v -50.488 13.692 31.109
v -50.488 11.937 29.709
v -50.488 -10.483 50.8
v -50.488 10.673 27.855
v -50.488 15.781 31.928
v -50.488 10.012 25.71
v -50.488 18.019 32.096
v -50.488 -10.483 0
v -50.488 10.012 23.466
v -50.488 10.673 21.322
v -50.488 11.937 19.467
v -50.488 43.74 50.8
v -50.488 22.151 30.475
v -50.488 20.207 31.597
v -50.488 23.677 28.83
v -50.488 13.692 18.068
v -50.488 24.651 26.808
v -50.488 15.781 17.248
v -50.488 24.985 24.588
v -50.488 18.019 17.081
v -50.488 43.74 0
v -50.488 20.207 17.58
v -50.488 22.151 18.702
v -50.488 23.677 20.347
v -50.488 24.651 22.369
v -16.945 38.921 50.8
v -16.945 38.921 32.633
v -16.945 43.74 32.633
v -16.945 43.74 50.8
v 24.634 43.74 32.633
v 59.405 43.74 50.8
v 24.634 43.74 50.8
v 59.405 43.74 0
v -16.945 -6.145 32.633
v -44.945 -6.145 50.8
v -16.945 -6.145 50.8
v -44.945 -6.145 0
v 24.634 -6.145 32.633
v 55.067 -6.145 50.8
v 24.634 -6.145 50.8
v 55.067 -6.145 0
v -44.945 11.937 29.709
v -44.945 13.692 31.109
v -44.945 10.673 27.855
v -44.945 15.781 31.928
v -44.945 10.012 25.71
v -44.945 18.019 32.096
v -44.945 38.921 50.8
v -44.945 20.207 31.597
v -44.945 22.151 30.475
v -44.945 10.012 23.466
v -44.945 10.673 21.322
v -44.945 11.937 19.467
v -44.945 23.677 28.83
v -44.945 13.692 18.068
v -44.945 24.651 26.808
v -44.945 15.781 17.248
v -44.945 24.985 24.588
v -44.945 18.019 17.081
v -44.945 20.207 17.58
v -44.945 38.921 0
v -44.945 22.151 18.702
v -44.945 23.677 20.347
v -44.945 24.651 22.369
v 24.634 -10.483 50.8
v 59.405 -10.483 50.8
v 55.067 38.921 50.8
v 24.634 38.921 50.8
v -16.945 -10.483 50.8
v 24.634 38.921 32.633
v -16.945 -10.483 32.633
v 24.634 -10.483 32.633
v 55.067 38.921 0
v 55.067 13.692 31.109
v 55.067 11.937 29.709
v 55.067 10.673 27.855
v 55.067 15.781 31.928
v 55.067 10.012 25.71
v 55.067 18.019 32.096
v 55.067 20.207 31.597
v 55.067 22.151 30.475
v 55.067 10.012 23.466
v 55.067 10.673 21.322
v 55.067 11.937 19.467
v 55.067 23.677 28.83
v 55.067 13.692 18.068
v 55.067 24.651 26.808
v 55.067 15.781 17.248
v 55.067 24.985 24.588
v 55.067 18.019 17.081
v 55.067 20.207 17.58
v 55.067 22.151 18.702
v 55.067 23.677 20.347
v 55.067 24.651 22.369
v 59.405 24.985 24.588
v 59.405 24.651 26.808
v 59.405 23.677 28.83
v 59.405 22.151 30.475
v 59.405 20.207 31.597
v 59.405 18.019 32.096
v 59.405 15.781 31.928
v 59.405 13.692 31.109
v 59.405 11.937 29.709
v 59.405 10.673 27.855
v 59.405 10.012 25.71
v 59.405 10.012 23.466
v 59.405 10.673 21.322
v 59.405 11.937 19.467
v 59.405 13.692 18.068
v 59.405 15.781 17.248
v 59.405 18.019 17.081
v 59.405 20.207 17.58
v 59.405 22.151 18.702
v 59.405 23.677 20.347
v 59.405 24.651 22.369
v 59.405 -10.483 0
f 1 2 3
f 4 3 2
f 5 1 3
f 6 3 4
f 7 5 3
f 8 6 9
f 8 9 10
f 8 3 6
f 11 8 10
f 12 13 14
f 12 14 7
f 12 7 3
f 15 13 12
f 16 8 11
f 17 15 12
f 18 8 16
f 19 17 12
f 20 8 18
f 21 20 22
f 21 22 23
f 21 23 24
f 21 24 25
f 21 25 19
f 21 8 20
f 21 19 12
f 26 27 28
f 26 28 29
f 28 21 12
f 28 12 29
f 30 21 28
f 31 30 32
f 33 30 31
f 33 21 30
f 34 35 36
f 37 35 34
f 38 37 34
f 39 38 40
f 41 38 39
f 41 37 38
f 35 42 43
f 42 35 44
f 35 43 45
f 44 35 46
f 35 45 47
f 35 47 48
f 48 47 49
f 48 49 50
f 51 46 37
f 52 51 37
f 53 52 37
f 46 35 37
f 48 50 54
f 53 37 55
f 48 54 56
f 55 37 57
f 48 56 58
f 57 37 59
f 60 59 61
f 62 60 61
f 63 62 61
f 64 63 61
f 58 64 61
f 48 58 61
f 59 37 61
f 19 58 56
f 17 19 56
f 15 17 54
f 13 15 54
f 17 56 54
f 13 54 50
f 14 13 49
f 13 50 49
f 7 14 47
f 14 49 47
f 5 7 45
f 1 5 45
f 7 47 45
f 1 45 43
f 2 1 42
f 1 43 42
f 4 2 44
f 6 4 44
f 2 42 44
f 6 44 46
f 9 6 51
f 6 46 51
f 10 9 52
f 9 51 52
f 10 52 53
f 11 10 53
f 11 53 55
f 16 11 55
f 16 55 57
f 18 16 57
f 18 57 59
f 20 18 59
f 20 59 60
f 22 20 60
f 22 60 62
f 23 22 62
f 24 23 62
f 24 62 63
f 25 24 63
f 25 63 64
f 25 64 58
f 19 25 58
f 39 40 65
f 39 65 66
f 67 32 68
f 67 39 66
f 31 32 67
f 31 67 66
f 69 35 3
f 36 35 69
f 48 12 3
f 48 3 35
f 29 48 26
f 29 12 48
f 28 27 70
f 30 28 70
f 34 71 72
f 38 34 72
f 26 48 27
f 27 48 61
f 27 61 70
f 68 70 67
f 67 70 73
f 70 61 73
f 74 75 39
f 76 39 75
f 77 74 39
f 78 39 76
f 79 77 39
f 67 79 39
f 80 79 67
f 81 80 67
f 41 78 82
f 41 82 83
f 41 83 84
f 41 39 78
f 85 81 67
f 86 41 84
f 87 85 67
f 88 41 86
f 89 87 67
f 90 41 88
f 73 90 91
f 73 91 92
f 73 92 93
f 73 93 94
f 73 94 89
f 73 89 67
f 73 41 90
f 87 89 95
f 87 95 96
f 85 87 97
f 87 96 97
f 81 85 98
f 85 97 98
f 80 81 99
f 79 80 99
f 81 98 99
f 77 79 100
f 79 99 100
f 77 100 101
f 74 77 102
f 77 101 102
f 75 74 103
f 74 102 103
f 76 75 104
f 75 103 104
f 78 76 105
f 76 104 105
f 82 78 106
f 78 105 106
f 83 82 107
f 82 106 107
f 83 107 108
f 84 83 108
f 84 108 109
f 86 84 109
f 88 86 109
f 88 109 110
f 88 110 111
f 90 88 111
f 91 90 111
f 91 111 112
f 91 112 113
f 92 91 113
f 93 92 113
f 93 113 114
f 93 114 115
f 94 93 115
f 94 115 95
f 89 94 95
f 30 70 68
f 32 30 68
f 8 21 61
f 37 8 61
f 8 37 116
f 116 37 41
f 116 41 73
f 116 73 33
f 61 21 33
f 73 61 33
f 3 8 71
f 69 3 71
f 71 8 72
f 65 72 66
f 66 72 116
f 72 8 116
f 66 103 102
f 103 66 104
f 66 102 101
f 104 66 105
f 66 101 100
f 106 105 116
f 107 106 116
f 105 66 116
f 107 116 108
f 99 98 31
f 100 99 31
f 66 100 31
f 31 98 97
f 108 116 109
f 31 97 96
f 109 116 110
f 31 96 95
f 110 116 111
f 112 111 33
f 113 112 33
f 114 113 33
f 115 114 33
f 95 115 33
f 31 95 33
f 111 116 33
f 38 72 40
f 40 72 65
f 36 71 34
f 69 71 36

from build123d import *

# Parameters (mm, degrees)
F0_W     = 109.893255
F0_H     = 54.223648
F0_W_2   = 100.012504
F0_H_2   = 45.065875
F1_DEPTH = 50.8
F2_W     = 41.578656
F2_H     = 18.166602
F4_DEPTH = 70.612
F3_R     = 7.528812
F5_DEPTH = 124.714


with BuildPart() as f1:
    # F0 (on Top) → F1 (new body)
    with BuildSketch(Plane.XY):
        with Locations((4.458386, 16.628586)):
            Rectangle(F0_W, F0_H)
        with Locations((5.060874, 16.387591)):
            Rectangle(F0_W_2, F0_H_2, mode=Mode.SUBTRACT)
    extrude(amount=F1_DEPTH)

    # F2 (on face) → F4 (cut)
    with BuildSketch(Plane.XZ.offset(10.483238)):
        with Locations((3.844391, 41.716699)):
            Rectangle(F2_W, F2_H)
    extrude(amount=-F4_DEPTH, mode=Mode.SUBTRACT)

    # F3 (on face) → F5 (cut)
    with BuildSketch(Plane.YZ.offset(59.405014)):
        with Locations((17.456431, 24.588371)):
            Circle(F3_R)
    extrude(amount=-F5_DEPTH, mode=Mode.SUBTRACT)


solid = f1.part
